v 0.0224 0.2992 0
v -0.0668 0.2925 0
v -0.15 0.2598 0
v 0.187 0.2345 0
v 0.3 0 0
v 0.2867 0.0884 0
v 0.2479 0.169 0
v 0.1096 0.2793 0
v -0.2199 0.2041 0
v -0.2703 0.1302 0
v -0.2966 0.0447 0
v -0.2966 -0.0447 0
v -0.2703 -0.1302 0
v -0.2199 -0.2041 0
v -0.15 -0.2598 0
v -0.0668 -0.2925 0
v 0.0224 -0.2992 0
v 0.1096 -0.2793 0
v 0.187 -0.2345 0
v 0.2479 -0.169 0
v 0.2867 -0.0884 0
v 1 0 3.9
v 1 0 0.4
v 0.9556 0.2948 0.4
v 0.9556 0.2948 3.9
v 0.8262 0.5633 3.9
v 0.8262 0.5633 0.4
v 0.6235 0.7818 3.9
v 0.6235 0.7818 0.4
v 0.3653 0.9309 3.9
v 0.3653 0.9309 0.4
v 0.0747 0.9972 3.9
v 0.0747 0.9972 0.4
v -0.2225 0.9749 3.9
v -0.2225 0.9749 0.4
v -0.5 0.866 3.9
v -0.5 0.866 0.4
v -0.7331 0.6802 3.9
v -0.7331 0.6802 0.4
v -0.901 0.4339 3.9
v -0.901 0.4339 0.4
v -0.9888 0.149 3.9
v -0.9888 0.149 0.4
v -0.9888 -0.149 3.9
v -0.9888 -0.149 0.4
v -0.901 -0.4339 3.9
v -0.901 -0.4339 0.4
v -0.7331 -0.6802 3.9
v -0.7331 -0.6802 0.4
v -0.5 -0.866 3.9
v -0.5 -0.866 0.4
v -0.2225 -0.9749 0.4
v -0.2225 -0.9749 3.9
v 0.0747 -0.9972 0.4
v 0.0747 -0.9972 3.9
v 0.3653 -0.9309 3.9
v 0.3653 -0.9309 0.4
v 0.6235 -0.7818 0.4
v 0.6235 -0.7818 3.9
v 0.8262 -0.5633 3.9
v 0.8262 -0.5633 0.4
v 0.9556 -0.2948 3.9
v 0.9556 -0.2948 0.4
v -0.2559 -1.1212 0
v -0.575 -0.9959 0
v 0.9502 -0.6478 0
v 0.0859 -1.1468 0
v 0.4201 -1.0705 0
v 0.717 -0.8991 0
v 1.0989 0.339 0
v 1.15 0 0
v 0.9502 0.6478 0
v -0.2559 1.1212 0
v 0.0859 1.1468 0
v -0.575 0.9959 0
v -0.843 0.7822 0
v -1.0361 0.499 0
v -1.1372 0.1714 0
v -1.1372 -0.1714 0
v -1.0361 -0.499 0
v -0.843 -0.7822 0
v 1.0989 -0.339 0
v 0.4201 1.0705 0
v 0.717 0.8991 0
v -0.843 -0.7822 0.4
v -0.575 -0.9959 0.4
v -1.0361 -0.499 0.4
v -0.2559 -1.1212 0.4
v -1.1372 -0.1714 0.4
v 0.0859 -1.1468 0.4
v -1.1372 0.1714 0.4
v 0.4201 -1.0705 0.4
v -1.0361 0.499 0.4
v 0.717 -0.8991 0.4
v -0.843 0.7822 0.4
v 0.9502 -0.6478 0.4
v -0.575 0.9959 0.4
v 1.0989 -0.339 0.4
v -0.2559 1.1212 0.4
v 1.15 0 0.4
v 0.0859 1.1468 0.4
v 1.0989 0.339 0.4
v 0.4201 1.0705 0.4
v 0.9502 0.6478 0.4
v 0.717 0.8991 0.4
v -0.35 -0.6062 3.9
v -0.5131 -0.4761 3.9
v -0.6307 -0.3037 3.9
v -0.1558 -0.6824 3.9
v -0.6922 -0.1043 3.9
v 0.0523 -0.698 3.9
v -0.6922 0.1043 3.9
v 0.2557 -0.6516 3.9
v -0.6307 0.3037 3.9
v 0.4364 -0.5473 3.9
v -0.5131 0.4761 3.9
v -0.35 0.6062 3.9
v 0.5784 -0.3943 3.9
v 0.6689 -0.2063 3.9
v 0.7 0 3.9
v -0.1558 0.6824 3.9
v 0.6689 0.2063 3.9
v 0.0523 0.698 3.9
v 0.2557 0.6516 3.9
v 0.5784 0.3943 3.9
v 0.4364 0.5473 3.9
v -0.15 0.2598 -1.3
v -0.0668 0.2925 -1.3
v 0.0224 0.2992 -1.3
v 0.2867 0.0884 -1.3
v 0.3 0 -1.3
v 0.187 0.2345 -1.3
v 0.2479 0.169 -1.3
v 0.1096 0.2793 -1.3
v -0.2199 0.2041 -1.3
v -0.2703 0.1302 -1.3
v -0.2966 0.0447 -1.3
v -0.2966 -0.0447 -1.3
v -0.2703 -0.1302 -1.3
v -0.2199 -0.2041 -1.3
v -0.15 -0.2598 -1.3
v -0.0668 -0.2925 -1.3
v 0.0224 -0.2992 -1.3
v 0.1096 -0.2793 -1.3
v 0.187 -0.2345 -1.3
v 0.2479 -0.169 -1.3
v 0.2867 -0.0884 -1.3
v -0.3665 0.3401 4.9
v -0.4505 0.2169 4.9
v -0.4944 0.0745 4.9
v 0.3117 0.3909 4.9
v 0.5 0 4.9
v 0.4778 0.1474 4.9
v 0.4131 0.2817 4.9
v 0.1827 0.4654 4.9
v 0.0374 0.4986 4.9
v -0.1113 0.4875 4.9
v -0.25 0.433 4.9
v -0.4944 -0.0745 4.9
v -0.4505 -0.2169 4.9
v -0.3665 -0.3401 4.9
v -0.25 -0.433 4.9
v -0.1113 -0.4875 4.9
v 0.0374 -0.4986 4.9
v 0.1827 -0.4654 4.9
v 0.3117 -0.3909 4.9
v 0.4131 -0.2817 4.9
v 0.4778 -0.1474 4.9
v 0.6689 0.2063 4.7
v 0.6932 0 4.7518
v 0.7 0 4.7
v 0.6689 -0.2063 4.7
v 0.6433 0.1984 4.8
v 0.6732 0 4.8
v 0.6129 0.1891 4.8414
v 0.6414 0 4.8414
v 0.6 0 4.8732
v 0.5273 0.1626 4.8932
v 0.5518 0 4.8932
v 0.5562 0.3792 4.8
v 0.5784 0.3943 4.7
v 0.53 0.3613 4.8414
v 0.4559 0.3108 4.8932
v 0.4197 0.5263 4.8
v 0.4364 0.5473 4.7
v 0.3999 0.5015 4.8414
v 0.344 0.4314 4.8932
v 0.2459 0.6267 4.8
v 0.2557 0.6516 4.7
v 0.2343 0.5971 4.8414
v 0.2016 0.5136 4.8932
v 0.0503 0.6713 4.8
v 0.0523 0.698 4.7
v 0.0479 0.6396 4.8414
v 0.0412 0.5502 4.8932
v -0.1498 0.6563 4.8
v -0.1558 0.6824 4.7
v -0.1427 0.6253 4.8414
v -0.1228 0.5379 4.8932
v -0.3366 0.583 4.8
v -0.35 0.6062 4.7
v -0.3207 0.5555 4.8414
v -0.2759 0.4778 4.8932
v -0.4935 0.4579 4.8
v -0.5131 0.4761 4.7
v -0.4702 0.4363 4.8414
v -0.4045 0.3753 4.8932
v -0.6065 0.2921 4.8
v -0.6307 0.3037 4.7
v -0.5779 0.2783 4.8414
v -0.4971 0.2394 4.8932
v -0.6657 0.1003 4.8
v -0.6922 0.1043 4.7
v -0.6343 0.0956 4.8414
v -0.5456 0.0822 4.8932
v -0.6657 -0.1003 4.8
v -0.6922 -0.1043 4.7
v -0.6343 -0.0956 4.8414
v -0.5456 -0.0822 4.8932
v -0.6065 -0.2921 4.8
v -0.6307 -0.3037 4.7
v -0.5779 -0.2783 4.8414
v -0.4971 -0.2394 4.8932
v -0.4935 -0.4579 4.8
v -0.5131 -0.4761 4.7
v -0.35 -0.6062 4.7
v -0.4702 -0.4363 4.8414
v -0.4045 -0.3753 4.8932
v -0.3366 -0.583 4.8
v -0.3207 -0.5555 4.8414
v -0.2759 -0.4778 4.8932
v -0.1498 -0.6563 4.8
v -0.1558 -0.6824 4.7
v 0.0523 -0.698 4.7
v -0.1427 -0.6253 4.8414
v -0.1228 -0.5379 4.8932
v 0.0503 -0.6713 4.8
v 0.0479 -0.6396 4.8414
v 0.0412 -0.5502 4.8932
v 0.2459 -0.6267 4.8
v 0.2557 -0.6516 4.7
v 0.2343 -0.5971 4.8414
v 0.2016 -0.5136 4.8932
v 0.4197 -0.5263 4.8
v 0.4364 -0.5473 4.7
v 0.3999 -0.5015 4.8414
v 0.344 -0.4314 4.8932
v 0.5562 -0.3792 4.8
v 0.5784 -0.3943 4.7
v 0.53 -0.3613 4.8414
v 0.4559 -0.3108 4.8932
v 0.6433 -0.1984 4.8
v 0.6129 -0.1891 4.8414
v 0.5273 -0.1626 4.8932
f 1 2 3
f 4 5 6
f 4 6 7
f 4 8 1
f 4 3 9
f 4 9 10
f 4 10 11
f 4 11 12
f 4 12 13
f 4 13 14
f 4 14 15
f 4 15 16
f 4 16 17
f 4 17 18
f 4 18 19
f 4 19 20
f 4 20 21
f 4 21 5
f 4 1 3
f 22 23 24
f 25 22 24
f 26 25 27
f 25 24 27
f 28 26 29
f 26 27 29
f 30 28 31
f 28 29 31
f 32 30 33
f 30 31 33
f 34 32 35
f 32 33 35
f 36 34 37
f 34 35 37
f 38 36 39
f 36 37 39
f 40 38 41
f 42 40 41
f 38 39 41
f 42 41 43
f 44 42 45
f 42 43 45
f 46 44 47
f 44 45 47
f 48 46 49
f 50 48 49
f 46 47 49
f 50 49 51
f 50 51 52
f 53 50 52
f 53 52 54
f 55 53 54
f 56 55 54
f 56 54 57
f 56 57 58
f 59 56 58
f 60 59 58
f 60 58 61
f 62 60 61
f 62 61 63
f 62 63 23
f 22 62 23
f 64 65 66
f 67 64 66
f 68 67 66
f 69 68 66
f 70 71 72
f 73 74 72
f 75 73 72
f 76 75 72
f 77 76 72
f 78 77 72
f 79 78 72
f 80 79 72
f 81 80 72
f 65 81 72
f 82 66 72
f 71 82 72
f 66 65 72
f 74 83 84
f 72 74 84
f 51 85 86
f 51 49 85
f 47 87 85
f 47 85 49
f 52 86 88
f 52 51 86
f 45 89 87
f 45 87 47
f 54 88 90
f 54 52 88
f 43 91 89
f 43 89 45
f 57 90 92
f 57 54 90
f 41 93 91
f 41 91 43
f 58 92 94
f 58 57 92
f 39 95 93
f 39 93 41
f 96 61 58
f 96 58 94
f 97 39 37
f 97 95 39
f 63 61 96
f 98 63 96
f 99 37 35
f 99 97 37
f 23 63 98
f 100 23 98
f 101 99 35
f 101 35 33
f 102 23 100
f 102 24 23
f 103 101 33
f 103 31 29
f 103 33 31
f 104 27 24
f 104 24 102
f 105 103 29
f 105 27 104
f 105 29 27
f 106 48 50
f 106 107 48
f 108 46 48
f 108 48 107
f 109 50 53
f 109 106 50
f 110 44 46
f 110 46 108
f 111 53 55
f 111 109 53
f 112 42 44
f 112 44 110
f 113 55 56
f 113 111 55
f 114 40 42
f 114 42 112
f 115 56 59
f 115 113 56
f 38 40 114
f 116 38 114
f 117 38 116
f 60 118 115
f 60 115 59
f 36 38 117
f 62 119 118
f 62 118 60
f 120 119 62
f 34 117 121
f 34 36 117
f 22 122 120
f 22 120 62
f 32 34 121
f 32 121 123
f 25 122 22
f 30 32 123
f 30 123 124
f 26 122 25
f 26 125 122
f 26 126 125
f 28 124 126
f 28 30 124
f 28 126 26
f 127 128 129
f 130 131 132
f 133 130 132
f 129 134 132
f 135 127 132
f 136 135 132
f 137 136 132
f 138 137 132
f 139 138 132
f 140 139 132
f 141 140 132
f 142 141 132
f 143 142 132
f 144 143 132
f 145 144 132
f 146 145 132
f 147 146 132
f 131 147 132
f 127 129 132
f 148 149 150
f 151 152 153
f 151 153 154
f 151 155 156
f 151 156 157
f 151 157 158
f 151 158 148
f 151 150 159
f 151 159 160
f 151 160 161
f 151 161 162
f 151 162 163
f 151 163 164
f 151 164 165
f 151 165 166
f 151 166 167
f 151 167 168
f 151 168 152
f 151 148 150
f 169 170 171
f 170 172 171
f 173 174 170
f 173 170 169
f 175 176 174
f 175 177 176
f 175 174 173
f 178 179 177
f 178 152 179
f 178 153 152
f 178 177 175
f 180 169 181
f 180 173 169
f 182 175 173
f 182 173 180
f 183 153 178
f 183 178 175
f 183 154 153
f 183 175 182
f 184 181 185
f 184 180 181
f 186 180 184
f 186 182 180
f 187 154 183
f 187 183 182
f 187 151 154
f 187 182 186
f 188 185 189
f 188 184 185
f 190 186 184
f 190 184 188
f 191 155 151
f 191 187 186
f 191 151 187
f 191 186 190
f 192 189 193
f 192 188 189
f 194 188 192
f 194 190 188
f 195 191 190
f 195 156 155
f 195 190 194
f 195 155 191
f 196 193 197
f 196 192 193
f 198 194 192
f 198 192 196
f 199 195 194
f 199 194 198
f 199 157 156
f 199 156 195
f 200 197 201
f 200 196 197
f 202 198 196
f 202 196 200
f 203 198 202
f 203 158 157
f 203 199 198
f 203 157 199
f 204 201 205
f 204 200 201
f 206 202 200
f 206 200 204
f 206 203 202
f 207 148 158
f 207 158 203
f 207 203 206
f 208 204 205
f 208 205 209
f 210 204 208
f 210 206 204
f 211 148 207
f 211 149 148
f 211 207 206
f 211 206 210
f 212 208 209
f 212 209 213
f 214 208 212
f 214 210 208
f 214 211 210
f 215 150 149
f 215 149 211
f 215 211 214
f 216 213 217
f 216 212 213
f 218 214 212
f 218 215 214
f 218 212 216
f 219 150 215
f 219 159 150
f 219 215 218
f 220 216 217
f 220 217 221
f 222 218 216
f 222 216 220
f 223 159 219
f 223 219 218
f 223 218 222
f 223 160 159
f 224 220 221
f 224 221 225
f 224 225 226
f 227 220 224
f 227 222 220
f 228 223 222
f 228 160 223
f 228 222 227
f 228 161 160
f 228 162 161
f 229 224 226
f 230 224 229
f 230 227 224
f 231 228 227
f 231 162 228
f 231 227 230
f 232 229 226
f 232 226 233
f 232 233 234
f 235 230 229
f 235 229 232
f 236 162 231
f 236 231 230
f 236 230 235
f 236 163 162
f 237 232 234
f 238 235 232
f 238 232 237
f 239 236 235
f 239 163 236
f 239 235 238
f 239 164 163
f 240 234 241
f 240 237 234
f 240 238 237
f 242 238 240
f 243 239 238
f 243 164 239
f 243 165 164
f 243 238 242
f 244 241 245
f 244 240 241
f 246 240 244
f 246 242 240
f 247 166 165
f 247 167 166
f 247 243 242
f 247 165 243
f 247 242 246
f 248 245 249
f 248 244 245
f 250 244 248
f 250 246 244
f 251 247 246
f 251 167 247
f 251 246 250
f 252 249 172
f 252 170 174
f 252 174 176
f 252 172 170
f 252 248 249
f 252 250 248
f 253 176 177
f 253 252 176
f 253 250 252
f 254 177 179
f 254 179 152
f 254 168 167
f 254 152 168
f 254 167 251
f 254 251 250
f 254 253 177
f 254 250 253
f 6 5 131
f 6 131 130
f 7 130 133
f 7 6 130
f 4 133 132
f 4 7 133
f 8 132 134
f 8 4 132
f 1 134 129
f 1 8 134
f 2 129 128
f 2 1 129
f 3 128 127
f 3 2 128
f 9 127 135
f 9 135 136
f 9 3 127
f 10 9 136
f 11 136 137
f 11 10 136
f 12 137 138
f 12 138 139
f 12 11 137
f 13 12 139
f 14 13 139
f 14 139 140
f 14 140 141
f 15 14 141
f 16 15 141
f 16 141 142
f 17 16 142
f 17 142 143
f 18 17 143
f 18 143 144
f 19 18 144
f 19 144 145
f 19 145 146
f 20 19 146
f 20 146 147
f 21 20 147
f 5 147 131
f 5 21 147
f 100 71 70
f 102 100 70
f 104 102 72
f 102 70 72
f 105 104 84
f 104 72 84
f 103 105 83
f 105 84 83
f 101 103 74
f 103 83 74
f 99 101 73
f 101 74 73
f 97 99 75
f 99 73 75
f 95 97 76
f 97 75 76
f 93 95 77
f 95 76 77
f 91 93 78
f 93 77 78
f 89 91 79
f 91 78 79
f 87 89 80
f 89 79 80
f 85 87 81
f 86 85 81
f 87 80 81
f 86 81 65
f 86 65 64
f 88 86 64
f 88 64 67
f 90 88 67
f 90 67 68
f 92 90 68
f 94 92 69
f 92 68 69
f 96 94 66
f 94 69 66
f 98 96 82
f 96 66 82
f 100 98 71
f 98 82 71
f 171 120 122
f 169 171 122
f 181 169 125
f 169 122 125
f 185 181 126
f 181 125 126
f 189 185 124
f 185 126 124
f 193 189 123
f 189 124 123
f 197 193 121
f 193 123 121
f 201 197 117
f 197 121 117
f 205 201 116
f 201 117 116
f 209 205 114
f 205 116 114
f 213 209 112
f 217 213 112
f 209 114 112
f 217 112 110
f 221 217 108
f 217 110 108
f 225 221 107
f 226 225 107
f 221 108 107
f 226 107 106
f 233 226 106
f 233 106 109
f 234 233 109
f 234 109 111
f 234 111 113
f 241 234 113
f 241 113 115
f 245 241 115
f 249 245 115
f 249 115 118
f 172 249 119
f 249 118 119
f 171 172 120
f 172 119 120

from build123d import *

# Parameters (mm, degrees)
SKETCH_1_R      = 1
SKETCH_1_R_2    = 0.3
EXTRUDE_1_DEPTH = 3.9
SKETCH_1_3_R    = 1.15
SKETCH_1_3_R_2  = 1
EXTRUDE_2_DEPTH = 0.4
SKETCH_1_4_R    = 0.3
EXTRUDE_3_DEPTH = 1.3
SKETCH_2_R      = 0.7
EXTRUDE_4_DEPTH = 1
FILLET_1_R      = 0.2


with BuildPart() as part:
    # Sketch 1 → Extrude 1 (new body)
    with BuildSketch(Plane.XY):
        Circle(SKETCH_1_R)
        Circle(SKETCH_1_R_2, mode=Mode.SUBTRACT)
        Circle(SKETCH_1_R_2)
    extrude(amount=EXTRUDE_1_DEPTH)

    # Sketch 1_3 → Extrude 2 (add)
    with BuildSketch(Plane.XY):
        Circle(SKETCH_1_3_R)
        Circle(SKETCH_1_3_R_2, mode=Mode.SUBTRACT)
    extrude(amount=EXTRUDE_2_DEPTH)

    # Sketch 2 → Extrude 4 (add)
    with BuildSketch(Plane.XY.offset(3.9)):
        Circle(SKETCH_2_R)
    extrude(amount=EXTRUDE_4_DEPTH)

    # Fillet 1
    fillet_1_edges = [part.edges().sort_by_distance(p)[0] for p in [
        (-0.7, 0, 4.9),
    ]]
    fillet(fillet_1_edges, radius=FILLET_1_R)


with BuildPart() as body_2:
    # Sketch 1_4 → Extrude 3 (new body)
    with BuildSketch(Plane.XY):
        Circle(SKETCH_1_4_R)
    extrude(amount=-EXTRUDE_3_DEPTH)


solid = Compound([part.part, body_2.part])
